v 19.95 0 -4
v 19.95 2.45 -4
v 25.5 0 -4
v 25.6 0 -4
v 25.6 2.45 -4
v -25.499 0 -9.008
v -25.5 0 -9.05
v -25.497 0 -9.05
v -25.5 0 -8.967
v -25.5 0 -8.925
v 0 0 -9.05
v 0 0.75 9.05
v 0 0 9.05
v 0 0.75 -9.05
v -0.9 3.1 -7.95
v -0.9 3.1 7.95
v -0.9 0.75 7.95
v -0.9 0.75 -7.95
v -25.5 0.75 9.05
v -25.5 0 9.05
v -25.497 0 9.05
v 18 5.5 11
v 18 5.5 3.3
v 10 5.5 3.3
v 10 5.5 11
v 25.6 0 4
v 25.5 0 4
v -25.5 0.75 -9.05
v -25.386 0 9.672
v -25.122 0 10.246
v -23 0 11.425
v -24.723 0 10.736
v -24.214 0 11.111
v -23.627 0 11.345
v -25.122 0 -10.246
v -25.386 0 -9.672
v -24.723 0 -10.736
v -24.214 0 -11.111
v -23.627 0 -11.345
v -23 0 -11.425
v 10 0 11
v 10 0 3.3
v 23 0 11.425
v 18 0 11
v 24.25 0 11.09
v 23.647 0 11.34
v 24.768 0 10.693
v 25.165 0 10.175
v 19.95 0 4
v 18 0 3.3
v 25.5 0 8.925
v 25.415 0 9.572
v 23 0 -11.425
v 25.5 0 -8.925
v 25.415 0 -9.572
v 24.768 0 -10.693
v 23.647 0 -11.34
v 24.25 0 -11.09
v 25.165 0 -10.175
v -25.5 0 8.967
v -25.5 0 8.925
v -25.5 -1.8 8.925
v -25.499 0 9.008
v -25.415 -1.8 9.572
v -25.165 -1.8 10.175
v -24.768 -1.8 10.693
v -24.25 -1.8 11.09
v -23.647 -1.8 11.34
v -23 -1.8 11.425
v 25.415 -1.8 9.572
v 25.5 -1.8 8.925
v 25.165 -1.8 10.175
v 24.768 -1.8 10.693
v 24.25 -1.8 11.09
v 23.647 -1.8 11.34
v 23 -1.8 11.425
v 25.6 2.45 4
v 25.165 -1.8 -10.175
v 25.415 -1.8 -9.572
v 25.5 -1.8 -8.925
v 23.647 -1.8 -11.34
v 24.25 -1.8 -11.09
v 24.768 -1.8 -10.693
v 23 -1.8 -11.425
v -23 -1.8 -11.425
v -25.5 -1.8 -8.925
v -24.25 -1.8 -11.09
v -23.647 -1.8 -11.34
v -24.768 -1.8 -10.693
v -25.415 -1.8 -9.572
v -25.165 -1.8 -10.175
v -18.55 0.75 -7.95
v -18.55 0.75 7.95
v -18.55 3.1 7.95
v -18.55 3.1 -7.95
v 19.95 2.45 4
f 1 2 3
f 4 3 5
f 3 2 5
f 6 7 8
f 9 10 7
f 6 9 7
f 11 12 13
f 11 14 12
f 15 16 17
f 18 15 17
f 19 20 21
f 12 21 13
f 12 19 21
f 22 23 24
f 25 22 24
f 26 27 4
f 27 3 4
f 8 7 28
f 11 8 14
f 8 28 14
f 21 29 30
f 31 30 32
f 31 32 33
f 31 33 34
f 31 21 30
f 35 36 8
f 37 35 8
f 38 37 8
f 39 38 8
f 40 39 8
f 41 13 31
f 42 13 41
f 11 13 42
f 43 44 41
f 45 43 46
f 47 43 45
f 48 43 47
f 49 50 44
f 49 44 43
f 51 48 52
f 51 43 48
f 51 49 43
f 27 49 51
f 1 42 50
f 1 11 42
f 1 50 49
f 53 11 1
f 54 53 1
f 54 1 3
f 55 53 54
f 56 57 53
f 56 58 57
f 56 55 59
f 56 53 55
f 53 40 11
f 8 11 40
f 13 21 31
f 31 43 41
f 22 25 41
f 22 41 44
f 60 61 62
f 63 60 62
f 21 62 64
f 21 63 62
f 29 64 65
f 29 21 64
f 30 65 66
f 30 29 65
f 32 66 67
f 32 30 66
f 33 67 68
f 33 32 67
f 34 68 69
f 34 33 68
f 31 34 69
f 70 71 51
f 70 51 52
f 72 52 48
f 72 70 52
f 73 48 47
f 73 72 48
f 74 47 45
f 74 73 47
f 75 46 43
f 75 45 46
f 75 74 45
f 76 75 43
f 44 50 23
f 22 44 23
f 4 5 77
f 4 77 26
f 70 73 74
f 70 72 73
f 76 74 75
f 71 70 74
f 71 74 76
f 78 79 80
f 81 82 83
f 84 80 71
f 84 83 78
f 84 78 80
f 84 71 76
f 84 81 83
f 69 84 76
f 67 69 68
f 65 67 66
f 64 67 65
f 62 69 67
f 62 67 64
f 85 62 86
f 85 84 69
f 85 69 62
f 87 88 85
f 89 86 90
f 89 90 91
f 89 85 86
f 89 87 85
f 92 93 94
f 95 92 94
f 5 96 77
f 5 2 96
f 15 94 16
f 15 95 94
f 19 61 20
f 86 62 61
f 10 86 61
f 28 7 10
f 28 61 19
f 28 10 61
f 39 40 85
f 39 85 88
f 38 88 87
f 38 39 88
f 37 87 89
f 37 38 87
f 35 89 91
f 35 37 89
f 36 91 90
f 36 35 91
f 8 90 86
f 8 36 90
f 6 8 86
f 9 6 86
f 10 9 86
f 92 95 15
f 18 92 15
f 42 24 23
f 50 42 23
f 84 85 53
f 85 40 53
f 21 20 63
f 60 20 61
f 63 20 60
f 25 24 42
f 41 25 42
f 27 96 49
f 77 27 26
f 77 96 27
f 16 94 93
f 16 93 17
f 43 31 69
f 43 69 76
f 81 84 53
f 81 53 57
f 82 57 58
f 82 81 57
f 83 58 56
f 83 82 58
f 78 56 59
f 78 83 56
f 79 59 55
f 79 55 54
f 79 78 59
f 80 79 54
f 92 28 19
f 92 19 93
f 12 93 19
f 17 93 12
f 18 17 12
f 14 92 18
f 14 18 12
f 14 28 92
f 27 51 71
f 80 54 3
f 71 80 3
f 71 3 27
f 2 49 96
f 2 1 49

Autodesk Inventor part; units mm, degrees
ref_plane "YZ Plane" through (0, 0, 0) normal (1, 0, 0) x (0, 1, 0)
ref_plane "XZ Plane" through (0, 0, 0) normal (0, 1, 0) x (-1, 0, 0)
ref_plane "XY Plane" through (0, 0, 0) normal (0, 0, 1) x (1, 0, 0)
sketch "ESP32 Feather" plane through (0, 0, 0) normal (0, 0, 1) x (1, 0, 0)
  line L0 (-25.5, 0) -> (25.5, 0)
  line L1 (25.5, 0) -> (25.5, -1.8)
  line L2 (25.5, -1.8) -> (-25.5, -1.8)
  line L3 (-25.5, -1.8) -> (-25.5, 0)
  line L4 (0, 0) -> (-25.5, 0)
  line L5 (-25.5, 0) -> (-25.5, 0.75)
  line L6 (-25.5, 0.75) -> (0, 0.75)
  line L7 (0, 0.75) -> (0, 0)
  line L8 (-0.9, 0.75) -> (-18.55, 0.75)
  line L9 (-18.55, 0.75) -> (-18.55, 3.1)
  line L10 (-18.55, 3.1) -> (-0.9, 3.1)
  line L11 (-0.9, 3.1) -> (-0.9, 0.75)
  line L12 (10, 0) -> (18, 0)
  line L13 (18, 0) -> (18, 5.5)
  line L14 (18, 5.5) -> (10, 5.5)
  line L15 (10, 5.5) -> (10, 0)
  line L16 (25.6, 0) -> (19.95, 0)
  line L17 (19.95, 0) -> (19.95, 2.45)
  line L18 (19.95, 2.45) -> (25.6, 2.45)
  line L19 (25.6, 2.45) -> (25.6, 0)
  point P0 (0, 0)
  point P1 (0, 0)
  point P2 (-18.55, 0.75)
  point P3 (18, 0)
  point P4 (19.95, 0)
  dimension "d0" = 51
  dimension "d1" = 1.8
  dimension "d2" = 0.75
  dimension "d3" = 25.5
  dimension "d4" = 17.65
  dimension "d5" = 2.35
  dimension "d6" = 24.6
  dimension "d7" = 8
  dimension "d8" = 5.5
  dimension "d9" = 15.5
  dimension "d10" = 2.45
  dimension "d11" = 5.65
  dimension "d25" = 0.1
extrude "PCB" add sketch "ESP32 Feather" along normal mid plane 22.85 contours L0 L1 L2 L3
fillet "Fillet1" radius 2.5 4 edges at (-25.5, -0.9, 11.425) (-25.5, -0.9, -11.425) (25.5, -0.9, -11.425) (25.5, -0.9, 11.425)
extrude "ESP32PCB" add sketch "ESP32 Feather" along normal mid plane 18.1 contours L5 L6 L7 L0
extrude "ESP32Shied" add sketch "ESP32 Feather" along normal mid plane 15.9 contours L9 L10 L11 L6
extrude "Battery Connector" add sketch "ESP32 Feather" along normal blind 11 contours L15 L14 L13 L0
extrude "Extrusion5" cut sketch "ESP32 Feather" along normal blind 3.3 contours L15 L14 L13 L0
extrude "Extrusion6" add sketch "ESP32 Feather" along normal mid plane 8 contours L0 L17 L18 L19 L16
equation "\"d28\" = d26"
equation "\"d29\" = d26"
equation "\"PCB_Width\" = 22.95"
equation "\"d26\" = 1"
properties part number "ESP32 Feather"
